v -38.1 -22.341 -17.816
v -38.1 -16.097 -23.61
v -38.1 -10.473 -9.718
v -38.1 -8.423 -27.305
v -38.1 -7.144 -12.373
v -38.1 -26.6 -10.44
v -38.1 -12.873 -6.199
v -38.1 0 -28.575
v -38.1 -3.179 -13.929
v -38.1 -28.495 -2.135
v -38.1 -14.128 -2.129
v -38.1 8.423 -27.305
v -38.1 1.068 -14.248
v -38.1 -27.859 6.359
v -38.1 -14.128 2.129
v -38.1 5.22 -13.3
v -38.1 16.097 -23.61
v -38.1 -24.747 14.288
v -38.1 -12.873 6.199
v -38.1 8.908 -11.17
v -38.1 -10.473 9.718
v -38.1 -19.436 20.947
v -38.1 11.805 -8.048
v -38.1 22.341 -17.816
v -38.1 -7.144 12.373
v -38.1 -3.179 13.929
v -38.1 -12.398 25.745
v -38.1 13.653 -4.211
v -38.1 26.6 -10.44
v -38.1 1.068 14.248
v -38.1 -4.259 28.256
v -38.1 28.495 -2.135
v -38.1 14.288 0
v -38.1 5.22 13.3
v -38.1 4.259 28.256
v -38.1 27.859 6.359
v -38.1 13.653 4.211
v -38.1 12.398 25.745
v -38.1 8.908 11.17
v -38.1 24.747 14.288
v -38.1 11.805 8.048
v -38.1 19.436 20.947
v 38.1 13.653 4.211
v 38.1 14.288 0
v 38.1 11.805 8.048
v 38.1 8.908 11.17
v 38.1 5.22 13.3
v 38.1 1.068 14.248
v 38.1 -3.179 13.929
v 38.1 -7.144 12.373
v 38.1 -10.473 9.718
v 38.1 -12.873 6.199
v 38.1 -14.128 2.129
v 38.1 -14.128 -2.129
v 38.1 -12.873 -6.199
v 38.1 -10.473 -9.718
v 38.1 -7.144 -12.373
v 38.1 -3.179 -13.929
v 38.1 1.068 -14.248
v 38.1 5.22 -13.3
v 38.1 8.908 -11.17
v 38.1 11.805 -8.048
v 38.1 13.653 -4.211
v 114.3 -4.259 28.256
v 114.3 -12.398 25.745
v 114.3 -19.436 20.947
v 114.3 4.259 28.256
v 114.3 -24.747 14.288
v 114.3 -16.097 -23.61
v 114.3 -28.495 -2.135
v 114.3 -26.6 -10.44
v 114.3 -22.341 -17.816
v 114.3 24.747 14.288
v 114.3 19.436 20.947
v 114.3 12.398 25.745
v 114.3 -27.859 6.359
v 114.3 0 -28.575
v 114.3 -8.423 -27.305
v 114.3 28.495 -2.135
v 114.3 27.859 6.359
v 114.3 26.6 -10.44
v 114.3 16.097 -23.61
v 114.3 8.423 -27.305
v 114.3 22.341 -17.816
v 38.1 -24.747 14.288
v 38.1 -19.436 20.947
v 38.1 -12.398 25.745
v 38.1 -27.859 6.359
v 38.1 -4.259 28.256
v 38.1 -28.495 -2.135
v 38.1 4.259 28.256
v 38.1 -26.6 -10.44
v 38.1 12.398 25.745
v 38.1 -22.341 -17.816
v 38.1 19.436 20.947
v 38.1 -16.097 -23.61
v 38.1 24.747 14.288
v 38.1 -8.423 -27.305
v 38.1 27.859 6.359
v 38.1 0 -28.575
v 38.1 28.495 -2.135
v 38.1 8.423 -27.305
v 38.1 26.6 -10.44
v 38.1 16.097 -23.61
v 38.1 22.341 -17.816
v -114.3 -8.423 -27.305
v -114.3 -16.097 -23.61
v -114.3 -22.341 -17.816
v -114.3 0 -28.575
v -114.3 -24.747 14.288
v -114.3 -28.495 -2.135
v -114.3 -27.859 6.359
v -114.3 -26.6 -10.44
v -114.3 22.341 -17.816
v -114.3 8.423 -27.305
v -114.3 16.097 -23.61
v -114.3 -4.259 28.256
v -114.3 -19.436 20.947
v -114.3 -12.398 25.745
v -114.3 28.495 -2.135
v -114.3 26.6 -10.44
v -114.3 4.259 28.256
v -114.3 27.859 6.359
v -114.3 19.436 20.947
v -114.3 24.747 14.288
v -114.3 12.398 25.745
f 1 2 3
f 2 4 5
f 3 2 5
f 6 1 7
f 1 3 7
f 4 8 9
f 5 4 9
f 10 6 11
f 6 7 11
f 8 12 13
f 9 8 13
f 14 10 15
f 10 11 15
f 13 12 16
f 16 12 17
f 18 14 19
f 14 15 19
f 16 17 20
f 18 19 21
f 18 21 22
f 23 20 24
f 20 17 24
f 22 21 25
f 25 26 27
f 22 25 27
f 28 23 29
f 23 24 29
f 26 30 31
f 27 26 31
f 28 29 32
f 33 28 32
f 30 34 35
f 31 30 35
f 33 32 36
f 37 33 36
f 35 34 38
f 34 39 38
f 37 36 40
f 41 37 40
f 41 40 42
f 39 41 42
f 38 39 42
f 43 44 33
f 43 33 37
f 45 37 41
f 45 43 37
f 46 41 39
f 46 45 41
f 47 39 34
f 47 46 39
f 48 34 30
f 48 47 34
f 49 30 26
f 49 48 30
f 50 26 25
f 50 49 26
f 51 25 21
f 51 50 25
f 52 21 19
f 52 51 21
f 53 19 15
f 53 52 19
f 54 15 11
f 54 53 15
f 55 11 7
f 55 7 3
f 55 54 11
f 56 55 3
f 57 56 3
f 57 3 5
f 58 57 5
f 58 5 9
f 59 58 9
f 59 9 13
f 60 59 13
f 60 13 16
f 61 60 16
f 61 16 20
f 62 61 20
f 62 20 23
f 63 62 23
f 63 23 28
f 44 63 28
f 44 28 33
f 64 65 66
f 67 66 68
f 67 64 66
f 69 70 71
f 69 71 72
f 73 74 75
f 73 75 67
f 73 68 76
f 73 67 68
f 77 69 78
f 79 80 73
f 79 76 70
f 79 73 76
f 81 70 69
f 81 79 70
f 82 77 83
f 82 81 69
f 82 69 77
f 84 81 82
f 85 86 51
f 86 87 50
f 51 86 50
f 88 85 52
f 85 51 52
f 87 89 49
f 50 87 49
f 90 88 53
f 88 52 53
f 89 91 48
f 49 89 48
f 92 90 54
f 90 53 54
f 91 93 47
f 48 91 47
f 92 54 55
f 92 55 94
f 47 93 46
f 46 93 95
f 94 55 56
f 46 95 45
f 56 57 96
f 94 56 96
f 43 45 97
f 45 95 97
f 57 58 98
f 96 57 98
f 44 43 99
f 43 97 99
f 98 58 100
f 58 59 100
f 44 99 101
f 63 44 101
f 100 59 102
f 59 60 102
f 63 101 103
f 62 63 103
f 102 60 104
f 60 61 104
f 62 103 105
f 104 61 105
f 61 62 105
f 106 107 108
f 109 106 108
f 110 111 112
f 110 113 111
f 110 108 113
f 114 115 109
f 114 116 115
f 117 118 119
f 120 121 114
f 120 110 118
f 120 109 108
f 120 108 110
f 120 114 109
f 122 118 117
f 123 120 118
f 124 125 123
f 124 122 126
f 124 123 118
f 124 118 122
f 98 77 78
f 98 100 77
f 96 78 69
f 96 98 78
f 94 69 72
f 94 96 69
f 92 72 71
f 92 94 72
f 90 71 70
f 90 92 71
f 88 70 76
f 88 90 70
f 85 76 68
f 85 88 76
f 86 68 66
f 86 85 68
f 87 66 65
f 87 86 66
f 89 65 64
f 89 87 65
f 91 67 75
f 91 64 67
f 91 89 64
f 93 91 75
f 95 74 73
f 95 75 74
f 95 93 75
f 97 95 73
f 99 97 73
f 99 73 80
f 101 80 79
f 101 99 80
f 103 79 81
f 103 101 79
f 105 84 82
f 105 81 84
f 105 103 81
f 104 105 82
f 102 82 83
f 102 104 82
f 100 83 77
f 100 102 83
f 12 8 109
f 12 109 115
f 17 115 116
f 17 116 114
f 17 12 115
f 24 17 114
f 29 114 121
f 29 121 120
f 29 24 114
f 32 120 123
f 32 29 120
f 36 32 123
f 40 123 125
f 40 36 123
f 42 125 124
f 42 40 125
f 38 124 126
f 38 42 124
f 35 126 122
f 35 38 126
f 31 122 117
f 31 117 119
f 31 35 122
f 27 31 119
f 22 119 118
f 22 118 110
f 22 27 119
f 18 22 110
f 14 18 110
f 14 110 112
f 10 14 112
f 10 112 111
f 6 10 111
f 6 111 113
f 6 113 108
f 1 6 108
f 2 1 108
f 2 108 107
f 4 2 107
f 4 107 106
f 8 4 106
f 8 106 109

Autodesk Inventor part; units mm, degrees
ref_plane "YZ Plane" through (0, 0, 0) normal (1, 0, 0) x (0, 1, 0)
ref_plane "XZ Plane" through (0, 0, 0) normal (0, 1, 0) x (-1, 0, 0)
ref_plane "XY Plane" through (0, 0, 0) normal (0, 0, 1) x (1, 0, 0)
sketch "Sketch2" plane through (0, 0, 0) normal (1, 0, 0) x (0, 1, 0)
  circle A0 centre (0, 0) radius 14.2875
  dimension "d0" = 28.575
extrude "Extrusion1" add sketch "Sketch2" along normal mid plane 76.2
sketch "Sketch3" plane through (38.1, 0, 0) normal (1, 0, 0) x (0, 0, -1)
  circle A0 centre (0, 0) radius 14.2875 projected
  circle A1 centre (0, 0) radius 28.575
  dimension "d3" = 57.15
extrude "Extrusion2" add sketch "Sketch3" along normal blind 76.2 contours A0 | A1
mirror "Mirror1" about plane through (0, 0, 0) normal (1, 0, 0) of "Extrusion2"
properties part number "Roller"
